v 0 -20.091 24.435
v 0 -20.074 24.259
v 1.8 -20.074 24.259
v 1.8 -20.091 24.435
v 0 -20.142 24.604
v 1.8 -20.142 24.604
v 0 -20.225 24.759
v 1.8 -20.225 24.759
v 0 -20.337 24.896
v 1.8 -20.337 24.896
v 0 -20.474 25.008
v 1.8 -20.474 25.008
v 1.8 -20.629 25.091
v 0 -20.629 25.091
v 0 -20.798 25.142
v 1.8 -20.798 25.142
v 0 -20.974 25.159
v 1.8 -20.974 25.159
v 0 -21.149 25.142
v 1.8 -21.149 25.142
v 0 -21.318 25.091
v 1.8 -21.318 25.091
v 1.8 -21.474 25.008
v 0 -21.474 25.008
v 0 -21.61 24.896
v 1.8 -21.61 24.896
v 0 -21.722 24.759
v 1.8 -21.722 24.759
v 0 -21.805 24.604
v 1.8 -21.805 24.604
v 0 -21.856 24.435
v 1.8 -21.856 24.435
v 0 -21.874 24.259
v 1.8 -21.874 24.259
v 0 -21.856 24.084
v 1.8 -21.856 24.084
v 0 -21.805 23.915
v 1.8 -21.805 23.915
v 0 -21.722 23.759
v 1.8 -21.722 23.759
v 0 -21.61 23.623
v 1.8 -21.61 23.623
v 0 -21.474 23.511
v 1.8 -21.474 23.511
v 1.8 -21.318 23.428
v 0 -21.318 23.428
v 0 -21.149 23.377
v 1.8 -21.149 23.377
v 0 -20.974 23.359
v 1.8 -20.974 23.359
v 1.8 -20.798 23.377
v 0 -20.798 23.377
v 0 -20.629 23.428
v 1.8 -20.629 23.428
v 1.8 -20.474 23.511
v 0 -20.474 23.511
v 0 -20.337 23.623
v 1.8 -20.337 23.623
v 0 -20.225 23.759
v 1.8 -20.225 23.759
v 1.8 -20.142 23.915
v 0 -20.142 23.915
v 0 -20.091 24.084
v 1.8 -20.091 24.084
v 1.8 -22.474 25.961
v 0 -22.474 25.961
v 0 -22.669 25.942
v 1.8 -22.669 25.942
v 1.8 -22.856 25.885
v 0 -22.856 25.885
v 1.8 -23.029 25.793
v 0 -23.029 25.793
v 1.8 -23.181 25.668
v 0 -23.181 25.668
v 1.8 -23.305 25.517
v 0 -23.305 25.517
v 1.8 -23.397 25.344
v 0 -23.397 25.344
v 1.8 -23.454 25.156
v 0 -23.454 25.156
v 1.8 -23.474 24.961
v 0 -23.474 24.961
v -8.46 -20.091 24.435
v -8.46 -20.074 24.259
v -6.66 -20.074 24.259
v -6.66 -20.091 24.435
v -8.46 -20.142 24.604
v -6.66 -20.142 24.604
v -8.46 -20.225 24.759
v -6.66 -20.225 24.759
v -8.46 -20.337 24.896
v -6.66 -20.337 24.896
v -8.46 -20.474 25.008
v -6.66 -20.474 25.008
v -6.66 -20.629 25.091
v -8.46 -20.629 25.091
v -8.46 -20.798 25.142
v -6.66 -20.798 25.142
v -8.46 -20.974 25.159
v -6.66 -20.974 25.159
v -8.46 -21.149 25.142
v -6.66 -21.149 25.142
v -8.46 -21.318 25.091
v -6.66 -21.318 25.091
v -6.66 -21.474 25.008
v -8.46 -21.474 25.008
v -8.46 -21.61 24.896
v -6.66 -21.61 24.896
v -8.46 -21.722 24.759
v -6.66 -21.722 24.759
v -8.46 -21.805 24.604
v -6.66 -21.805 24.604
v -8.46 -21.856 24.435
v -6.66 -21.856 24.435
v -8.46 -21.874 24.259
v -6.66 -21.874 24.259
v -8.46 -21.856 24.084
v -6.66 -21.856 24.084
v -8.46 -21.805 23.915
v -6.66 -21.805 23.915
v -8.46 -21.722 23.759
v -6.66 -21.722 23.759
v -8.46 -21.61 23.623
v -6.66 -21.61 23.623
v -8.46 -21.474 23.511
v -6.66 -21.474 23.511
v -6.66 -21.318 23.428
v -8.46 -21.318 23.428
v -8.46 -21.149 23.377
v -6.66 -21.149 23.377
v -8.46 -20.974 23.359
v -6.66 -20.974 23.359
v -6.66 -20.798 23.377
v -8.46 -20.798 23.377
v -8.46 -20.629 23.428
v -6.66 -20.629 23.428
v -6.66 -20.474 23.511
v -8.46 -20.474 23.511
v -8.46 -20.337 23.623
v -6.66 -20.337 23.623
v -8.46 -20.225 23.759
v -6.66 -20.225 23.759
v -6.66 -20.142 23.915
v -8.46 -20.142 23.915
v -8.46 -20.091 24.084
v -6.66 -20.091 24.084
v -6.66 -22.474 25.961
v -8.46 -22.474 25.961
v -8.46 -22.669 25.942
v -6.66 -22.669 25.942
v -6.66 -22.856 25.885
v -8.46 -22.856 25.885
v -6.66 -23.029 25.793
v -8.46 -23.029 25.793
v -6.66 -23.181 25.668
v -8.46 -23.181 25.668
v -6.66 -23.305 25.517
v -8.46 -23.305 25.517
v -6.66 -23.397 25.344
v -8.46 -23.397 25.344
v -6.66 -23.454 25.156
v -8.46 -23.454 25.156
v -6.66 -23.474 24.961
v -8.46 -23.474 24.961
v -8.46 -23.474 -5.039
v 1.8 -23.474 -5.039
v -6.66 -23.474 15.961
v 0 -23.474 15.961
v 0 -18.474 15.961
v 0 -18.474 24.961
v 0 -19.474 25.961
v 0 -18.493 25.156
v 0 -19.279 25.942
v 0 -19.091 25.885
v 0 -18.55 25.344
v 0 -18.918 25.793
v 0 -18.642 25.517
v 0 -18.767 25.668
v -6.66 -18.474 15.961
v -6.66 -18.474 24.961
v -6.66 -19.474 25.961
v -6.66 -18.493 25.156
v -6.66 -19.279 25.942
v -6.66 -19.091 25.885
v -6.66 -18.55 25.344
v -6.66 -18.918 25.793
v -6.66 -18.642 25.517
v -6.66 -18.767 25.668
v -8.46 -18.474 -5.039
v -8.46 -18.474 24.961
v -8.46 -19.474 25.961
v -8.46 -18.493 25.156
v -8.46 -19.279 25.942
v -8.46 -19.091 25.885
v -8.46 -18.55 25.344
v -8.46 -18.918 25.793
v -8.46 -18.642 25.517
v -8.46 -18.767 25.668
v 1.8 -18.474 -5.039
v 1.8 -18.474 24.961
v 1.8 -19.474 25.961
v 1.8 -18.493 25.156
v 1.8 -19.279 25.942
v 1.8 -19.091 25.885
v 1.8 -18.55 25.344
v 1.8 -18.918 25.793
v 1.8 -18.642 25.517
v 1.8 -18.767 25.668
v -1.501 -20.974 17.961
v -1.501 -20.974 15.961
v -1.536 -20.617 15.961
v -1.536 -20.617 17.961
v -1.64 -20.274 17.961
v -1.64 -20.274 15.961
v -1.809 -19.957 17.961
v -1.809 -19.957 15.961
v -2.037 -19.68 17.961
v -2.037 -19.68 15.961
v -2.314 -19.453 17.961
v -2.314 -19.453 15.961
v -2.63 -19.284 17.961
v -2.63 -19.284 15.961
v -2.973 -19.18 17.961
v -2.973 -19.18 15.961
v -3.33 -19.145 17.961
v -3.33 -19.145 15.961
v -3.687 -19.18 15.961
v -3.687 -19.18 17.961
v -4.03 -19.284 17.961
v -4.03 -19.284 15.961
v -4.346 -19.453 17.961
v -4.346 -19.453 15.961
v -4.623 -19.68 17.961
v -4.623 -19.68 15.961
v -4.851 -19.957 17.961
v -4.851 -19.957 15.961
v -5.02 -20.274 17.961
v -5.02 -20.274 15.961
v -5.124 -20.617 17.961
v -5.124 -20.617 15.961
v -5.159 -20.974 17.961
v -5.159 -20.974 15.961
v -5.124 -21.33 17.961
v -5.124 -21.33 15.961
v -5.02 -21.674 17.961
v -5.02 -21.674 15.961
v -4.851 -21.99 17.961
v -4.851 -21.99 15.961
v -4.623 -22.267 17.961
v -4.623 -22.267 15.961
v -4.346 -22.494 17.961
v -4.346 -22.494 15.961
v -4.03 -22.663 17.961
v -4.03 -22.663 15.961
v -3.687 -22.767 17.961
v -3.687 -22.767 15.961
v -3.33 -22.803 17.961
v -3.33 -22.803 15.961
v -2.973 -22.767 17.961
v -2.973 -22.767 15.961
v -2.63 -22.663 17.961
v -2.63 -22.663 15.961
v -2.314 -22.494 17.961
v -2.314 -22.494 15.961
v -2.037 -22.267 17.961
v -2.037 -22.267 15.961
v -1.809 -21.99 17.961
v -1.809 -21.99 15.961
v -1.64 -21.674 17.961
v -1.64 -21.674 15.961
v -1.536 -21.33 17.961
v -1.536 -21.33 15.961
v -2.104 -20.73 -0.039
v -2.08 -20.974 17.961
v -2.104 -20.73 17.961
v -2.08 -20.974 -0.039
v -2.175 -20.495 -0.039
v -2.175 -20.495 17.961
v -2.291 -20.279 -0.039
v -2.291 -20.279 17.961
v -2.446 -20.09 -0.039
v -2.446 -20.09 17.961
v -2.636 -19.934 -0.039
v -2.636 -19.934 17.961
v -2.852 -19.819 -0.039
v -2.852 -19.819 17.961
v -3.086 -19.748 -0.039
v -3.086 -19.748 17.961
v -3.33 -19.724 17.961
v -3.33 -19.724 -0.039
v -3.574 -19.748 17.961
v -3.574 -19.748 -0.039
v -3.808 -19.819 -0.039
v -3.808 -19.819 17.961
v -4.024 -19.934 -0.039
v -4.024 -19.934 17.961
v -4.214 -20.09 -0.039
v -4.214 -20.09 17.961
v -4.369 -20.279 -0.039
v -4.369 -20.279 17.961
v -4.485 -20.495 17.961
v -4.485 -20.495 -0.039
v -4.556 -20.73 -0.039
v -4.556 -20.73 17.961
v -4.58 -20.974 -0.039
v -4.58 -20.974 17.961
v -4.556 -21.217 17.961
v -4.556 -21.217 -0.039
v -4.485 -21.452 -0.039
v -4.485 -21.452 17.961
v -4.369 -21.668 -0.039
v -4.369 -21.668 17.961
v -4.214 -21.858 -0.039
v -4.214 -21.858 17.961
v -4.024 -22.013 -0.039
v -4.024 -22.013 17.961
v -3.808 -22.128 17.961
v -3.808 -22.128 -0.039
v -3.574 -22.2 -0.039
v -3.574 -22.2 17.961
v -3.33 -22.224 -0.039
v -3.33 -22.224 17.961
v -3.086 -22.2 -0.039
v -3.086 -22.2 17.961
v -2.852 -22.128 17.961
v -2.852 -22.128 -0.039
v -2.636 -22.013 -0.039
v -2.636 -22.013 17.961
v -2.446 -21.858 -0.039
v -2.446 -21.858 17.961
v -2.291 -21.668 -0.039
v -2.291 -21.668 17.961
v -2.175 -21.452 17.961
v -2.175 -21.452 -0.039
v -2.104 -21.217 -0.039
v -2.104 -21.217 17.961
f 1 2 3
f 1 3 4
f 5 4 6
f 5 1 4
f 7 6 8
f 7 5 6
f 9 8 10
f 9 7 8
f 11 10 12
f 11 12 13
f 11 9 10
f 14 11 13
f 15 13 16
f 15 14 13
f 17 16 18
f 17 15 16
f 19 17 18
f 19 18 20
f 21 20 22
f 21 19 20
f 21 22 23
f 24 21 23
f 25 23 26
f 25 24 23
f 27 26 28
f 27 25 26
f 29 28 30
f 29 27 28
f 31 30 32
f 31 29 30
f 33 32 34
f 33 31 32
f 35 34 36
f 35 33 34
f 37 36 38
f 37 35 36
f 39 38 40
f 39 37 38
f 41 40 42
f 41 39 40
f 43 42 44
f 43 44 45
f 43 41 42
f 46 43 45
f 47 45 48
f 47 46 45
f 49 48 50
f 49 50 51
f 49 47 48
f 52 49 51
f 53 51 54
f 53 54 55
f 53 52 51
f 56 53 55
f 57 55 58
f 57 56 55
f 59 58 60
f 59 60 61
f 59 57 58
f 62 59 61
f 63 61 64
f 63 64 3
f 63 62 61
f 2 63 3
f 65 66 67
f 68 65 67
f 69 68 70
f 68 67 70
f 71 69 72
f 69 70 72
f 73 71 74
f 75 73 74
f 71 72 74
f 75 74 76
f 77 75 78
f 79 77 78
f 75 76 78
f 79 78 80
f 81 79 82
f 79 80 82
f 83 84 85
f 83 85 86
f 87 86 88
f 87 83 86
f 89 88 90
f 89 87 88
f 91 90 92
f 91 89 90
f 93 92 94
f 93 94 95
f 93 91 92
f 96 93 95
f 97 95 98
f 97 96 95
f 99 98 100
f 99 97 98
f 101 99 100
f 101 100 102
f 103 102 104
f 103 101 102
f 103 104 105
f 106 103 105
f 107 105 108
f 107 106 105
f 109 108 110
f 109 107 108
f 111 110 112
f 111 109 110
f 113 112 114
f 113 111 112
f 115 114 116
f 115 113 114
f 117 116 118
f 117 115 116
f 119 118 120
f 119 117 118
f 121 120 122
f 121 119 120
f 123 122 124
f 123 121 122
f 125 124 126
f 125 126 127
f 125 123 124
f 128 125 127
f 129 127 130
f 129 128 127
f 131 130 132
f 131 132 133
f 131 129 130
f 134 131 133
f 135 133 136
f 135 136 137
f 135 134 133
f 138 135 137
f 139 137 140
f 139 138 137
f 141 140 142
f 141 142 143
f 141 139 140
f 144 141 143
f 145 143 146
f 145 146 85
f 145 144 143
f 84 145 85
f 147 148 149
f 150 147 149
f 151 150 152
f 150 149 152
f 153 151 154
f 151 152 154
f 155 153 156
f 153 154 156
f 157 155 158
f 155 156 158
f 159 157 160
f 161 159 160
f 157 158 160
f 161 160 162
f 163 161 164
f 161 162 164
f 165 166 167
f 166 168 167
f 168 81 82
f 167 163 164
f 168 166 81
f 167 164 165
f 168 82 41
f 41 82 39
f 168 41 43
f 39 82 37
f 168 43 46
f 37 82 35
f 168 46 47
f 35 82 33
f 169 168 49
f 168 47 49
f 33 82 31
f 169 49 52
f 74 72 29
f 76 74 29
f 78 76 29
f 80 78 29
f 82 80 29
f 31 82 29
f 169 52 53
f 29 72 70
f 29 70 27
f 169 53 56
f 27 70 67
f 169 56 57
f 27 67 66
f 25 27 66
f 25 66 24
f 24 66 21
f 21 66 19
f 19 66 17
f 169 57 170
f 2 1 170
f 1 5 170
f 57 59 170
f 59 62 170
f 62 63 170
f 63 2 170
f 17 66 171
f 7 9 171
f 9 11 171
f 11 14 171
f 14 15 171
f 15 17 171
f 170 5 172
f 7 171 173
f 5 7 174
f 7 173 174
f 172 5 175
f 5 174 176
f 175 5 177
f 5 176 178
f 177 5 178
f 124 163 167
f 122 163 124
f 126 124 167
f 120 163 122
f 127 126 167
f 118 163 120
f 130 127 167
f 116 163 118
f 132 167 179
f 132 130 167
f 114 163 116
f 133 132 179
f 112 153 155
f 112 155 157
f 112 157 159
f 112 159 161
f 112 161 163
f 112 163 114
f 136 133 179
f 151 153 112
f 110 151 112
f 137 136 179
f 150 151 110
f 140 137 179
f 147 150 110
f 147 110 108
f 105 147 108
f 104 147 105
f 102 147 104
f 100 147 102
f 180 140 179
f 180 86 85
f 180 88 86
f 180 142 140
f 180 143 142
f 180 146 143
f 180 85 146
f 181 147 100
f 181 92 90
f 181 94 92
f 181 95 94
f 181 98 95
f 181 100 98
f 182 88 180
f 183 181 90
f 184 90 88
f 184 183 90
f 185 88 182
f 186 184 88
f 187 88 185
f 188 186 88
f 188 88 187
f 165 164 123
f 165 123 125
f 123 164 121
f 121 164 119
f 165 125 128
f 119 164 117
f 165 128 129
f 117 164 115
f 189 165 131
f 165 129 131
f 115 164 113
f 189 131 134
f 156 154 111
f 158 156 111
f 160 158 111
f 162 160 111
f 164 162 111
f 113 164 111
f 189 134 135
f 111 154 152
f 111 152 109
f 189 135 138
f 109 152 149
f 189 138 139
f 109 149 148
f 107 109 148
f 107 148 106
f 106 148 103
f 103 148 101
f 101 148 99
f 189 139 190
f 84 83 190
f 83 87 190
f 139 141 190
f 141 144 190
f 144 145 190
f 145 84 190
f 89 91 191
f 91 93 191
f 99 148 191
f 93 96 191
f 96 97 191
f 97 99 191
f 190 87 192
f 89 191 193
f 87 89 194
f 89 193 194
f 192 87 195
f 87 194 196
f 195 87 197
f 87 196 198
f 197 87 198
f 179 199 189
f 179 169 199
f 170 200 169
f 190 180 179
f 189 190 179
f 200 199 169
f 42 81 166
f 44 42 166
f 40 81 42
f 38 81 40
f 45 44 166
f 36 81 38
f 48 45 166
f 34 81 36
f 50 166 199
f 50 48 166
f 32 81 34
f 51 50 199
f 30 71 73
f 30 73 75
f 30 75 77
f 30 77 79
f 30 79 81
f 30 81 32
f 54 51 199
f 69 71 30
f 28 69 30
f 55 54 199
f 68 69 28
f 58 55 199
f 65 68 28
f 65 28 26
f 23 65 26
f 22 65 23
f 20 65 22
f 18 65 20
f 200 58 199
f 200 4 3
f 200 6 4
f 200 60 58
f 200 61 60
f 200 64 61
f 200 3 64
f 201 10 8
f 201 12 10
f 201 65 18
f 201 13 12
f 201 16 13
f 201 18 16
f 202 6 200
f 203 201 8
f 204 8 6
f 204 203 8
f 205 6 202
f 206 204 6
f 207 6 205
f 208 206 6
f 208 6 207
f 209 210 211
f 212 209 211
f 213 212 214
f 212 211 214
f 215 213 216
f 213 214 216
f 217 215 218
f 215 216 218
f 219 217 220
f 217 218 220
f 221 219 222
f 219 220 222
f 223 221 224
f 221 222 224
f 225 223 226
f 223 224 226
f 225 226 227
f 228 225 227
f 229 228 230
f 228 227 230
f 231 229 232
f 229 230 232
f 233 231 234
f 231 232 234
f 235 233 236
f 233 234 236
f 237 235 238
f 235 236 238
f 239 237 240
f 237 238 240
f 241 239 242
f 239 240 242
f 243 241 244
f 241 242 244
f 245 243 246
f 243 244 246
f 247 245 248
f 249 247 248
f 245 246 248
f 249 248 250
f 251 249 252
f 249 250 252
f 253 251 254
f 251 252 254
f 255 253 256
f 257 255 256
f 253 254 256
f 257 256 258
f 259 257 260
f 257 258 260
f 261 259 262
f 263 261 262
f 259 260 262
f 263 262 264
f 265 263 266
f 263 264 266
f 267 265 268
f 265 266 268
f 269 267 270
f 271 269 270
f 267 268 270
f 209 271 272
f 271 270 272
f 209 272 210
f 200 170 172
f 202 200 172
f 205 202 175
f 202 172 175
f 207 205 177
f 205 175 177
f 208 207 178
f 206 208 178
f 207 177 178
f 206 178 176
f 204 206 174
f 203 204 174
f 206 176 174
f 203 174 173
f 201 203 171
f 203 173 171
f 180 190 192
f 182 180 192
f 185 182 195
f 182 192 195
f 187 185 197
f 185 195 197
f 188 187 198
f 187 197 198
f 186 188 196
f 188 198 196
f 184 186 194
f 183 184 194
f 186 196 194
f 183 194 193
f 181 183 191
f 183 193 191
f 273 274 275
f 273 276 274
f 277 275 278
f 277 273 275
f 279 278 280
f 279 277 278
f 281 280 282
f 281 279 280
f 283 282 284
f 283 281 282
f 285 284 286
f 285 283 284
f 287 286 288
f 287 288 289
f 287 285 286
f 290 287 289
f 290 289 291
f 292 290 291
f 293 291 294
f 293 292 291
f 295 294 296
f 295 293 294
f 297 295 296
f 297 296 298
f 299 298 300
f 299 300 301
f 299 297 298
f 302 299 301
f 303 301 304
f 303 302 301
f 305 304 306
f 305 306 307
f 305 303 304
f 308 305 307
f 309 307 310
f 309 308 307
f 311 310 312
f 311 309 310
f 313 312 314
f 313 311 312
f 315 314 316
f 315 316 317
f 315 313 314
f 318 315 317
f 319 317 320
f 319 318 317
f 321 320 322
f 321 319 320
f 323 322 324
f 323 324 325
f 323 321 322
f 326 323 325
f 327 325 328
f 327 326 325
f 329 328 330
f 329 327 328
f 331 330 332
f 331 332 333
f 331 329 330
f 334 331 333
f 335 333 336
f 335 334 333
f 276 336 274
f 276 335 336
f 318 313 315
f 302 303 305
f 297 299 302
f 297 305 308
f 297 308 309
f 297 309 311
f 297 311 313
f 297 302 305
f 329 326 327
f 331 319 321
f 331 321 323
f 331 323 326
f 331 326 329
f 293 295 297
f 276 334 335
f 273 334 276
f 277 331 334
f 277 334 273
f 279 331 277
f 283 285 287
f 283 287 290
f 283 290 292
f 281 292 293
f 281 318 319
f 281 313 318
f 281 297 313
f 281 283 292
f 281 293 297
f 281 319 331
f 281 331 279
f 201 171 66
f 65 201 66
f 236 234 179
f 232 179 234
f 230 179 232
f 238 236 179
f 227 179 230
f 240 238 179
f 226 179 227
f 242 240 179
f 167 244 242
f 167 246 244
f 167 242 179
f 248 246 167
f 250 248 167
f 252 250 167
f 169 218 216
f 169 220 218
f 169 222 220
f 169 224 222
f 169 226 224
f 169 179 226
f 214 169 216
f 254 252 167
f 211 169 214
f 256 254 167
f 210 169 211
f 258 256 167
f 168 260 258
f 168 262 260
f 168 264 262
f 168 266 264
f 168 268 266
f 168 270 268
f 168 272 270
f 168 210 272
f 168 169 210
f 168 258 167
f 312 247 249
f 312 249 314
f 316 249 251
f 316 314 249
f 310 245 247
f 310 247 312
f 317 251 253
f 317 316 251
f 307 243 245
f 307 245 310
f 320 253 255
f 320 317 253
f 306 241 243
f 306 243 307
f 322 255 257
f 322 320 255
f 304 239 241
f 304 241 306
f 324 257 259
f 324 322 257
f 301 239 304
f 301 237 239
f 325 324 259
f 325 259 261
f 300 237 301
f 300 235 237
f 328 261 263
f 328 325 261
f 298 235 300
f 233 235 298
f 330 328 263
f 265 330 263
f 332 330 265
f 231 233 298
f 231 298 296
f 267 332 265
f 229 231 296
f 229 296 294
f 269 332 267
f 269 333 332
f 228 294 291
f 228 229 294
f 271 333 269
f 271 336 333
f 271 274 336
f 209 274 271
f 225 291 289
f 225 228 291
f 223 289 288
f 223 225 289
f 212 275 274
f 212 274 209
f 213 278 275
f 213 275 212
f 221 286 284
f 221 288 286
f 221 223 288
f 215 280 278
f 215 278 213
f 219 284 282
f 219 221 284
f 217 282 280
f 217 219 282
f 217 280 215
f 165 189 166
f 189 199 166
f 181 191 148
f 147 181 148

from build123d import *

# Parameters (mm, degrees)
F0_R      = 0.9
F1_DEPTH  = 1.8
F2_DEPTH  = 2
F3_W      = 5
F3_H      = 2
F5_DEPTH  = 6.66
F6_R      = 1.8308670993
F7_DEPTH  = 19
F8_R      = 1.25
F9_DEPTH  = 16
F10_DEPTH = 19
F11_R     = 1.8290202659
F11_R_2   = 1.25
F12_DEPTH = 2


with BuildPart() as f1:
    # F0 (on Right) → F1 (new body)
    with BuildSketch(Plane.YZ):
        with BuildLine():
            Line((-19.4736195393, 25.9610565752), (-22.4736195393, 25.9610565752))
            ThreePointArc((-22.4736195393, 25.9610565752), (-23.1807263205, 25.6681633564), (-23.4736195393, 24.9610565752))
            Line((-23.4736195393, 24.9610565752), (-23.4736195393, 15.9610565752))
            Line((-23.4736195393, 15.9610565752), (-18.4736195393, 15.9610565752))
            Line((-18.4736195393, 15.9610565752), (-18.4736195393, 24.9610565752))
            ThreePointArc((-18.4736195393, 24.9610565752), (-18.7665127581, 25.6681633564), (-19.4736195393, 25.9610565752))
        make_face()
        with Locations((-20.9736195393, 24.2594238371)):
            Circle(F0_R, mode=Mode.SUBTRACT)
    extrude(amount=F1_DEPTH)

    # F2 (add): a face of the model
    f2_faces = [f1.faces().sort_by_distance(p)[0] for p in [
        (0.9, -20.9736195393, 15.9610565752),
    ]]
    extrude(f2_faces, amount=F2_DEPTH)


with BuildPart() as f4_1:
    # F4: copy of F1
    add(f1.part.moved(Location((-8.46, 0, 0))))


with BuildPart() as f1_1:
    add(f1.part)

    add(f4_1.part)  # F5 merges F4_1
    # F3 (on face) → F5 (join)
    with BuildSketch(Plane(origin=(0, 0, 0), x_dir=(0, -1, 0), z_dir=(-1, 0, 0))):
        with Locations((20.9736195393, 14.9610565752)):
            Rectangle(F3_W, F3_H)
    extrude(amount=F5_DEPTH)

    # F6 (on face) → F7 (join)
    with BuildSketch(Plane(origin=(0, 0, 13.9610565752), x_dir=(1, 0, 0), z_dir=(0, 0, -1))):
        with Locations((-3.33, 20.9736195393)):
            Circle(F6_R)
    extrude(amount=F7_DEPTH)

    # F8 (on face) → F9 (cut)
    with BuildSketch(Plane.XY.offset(15.9610565752)):
        with Locations((-3.33, -20.9736195393)):
            Circle(F8_R)
    extrude(amount=-F9_DEPTH, mode=Mode.SUBTRACT)

    # F10 (add): a face of the model
    f10_faces = [f1_1.faces().sort_by_distance(p)[0] for p in [
        (-3.33, -23.3594847067, 13.9610565752),
    ]]
    extrude(f10_faces, amount=F10_DEPTH)

    # F11 (on face) → F12 (join)
    with BuildSketch(Plane.XY.offset(15.9610565752)):
        with Locations((-3.33, -20.9736195393)):
            Circle(F11_R)
        with Locations((-3.33, -20.9736195393)):
            Circle(F11_R_2, mode=Mode.SUBTRACT)
    extrude(amount=F12_DEPTH)


solid = f1_1.part
